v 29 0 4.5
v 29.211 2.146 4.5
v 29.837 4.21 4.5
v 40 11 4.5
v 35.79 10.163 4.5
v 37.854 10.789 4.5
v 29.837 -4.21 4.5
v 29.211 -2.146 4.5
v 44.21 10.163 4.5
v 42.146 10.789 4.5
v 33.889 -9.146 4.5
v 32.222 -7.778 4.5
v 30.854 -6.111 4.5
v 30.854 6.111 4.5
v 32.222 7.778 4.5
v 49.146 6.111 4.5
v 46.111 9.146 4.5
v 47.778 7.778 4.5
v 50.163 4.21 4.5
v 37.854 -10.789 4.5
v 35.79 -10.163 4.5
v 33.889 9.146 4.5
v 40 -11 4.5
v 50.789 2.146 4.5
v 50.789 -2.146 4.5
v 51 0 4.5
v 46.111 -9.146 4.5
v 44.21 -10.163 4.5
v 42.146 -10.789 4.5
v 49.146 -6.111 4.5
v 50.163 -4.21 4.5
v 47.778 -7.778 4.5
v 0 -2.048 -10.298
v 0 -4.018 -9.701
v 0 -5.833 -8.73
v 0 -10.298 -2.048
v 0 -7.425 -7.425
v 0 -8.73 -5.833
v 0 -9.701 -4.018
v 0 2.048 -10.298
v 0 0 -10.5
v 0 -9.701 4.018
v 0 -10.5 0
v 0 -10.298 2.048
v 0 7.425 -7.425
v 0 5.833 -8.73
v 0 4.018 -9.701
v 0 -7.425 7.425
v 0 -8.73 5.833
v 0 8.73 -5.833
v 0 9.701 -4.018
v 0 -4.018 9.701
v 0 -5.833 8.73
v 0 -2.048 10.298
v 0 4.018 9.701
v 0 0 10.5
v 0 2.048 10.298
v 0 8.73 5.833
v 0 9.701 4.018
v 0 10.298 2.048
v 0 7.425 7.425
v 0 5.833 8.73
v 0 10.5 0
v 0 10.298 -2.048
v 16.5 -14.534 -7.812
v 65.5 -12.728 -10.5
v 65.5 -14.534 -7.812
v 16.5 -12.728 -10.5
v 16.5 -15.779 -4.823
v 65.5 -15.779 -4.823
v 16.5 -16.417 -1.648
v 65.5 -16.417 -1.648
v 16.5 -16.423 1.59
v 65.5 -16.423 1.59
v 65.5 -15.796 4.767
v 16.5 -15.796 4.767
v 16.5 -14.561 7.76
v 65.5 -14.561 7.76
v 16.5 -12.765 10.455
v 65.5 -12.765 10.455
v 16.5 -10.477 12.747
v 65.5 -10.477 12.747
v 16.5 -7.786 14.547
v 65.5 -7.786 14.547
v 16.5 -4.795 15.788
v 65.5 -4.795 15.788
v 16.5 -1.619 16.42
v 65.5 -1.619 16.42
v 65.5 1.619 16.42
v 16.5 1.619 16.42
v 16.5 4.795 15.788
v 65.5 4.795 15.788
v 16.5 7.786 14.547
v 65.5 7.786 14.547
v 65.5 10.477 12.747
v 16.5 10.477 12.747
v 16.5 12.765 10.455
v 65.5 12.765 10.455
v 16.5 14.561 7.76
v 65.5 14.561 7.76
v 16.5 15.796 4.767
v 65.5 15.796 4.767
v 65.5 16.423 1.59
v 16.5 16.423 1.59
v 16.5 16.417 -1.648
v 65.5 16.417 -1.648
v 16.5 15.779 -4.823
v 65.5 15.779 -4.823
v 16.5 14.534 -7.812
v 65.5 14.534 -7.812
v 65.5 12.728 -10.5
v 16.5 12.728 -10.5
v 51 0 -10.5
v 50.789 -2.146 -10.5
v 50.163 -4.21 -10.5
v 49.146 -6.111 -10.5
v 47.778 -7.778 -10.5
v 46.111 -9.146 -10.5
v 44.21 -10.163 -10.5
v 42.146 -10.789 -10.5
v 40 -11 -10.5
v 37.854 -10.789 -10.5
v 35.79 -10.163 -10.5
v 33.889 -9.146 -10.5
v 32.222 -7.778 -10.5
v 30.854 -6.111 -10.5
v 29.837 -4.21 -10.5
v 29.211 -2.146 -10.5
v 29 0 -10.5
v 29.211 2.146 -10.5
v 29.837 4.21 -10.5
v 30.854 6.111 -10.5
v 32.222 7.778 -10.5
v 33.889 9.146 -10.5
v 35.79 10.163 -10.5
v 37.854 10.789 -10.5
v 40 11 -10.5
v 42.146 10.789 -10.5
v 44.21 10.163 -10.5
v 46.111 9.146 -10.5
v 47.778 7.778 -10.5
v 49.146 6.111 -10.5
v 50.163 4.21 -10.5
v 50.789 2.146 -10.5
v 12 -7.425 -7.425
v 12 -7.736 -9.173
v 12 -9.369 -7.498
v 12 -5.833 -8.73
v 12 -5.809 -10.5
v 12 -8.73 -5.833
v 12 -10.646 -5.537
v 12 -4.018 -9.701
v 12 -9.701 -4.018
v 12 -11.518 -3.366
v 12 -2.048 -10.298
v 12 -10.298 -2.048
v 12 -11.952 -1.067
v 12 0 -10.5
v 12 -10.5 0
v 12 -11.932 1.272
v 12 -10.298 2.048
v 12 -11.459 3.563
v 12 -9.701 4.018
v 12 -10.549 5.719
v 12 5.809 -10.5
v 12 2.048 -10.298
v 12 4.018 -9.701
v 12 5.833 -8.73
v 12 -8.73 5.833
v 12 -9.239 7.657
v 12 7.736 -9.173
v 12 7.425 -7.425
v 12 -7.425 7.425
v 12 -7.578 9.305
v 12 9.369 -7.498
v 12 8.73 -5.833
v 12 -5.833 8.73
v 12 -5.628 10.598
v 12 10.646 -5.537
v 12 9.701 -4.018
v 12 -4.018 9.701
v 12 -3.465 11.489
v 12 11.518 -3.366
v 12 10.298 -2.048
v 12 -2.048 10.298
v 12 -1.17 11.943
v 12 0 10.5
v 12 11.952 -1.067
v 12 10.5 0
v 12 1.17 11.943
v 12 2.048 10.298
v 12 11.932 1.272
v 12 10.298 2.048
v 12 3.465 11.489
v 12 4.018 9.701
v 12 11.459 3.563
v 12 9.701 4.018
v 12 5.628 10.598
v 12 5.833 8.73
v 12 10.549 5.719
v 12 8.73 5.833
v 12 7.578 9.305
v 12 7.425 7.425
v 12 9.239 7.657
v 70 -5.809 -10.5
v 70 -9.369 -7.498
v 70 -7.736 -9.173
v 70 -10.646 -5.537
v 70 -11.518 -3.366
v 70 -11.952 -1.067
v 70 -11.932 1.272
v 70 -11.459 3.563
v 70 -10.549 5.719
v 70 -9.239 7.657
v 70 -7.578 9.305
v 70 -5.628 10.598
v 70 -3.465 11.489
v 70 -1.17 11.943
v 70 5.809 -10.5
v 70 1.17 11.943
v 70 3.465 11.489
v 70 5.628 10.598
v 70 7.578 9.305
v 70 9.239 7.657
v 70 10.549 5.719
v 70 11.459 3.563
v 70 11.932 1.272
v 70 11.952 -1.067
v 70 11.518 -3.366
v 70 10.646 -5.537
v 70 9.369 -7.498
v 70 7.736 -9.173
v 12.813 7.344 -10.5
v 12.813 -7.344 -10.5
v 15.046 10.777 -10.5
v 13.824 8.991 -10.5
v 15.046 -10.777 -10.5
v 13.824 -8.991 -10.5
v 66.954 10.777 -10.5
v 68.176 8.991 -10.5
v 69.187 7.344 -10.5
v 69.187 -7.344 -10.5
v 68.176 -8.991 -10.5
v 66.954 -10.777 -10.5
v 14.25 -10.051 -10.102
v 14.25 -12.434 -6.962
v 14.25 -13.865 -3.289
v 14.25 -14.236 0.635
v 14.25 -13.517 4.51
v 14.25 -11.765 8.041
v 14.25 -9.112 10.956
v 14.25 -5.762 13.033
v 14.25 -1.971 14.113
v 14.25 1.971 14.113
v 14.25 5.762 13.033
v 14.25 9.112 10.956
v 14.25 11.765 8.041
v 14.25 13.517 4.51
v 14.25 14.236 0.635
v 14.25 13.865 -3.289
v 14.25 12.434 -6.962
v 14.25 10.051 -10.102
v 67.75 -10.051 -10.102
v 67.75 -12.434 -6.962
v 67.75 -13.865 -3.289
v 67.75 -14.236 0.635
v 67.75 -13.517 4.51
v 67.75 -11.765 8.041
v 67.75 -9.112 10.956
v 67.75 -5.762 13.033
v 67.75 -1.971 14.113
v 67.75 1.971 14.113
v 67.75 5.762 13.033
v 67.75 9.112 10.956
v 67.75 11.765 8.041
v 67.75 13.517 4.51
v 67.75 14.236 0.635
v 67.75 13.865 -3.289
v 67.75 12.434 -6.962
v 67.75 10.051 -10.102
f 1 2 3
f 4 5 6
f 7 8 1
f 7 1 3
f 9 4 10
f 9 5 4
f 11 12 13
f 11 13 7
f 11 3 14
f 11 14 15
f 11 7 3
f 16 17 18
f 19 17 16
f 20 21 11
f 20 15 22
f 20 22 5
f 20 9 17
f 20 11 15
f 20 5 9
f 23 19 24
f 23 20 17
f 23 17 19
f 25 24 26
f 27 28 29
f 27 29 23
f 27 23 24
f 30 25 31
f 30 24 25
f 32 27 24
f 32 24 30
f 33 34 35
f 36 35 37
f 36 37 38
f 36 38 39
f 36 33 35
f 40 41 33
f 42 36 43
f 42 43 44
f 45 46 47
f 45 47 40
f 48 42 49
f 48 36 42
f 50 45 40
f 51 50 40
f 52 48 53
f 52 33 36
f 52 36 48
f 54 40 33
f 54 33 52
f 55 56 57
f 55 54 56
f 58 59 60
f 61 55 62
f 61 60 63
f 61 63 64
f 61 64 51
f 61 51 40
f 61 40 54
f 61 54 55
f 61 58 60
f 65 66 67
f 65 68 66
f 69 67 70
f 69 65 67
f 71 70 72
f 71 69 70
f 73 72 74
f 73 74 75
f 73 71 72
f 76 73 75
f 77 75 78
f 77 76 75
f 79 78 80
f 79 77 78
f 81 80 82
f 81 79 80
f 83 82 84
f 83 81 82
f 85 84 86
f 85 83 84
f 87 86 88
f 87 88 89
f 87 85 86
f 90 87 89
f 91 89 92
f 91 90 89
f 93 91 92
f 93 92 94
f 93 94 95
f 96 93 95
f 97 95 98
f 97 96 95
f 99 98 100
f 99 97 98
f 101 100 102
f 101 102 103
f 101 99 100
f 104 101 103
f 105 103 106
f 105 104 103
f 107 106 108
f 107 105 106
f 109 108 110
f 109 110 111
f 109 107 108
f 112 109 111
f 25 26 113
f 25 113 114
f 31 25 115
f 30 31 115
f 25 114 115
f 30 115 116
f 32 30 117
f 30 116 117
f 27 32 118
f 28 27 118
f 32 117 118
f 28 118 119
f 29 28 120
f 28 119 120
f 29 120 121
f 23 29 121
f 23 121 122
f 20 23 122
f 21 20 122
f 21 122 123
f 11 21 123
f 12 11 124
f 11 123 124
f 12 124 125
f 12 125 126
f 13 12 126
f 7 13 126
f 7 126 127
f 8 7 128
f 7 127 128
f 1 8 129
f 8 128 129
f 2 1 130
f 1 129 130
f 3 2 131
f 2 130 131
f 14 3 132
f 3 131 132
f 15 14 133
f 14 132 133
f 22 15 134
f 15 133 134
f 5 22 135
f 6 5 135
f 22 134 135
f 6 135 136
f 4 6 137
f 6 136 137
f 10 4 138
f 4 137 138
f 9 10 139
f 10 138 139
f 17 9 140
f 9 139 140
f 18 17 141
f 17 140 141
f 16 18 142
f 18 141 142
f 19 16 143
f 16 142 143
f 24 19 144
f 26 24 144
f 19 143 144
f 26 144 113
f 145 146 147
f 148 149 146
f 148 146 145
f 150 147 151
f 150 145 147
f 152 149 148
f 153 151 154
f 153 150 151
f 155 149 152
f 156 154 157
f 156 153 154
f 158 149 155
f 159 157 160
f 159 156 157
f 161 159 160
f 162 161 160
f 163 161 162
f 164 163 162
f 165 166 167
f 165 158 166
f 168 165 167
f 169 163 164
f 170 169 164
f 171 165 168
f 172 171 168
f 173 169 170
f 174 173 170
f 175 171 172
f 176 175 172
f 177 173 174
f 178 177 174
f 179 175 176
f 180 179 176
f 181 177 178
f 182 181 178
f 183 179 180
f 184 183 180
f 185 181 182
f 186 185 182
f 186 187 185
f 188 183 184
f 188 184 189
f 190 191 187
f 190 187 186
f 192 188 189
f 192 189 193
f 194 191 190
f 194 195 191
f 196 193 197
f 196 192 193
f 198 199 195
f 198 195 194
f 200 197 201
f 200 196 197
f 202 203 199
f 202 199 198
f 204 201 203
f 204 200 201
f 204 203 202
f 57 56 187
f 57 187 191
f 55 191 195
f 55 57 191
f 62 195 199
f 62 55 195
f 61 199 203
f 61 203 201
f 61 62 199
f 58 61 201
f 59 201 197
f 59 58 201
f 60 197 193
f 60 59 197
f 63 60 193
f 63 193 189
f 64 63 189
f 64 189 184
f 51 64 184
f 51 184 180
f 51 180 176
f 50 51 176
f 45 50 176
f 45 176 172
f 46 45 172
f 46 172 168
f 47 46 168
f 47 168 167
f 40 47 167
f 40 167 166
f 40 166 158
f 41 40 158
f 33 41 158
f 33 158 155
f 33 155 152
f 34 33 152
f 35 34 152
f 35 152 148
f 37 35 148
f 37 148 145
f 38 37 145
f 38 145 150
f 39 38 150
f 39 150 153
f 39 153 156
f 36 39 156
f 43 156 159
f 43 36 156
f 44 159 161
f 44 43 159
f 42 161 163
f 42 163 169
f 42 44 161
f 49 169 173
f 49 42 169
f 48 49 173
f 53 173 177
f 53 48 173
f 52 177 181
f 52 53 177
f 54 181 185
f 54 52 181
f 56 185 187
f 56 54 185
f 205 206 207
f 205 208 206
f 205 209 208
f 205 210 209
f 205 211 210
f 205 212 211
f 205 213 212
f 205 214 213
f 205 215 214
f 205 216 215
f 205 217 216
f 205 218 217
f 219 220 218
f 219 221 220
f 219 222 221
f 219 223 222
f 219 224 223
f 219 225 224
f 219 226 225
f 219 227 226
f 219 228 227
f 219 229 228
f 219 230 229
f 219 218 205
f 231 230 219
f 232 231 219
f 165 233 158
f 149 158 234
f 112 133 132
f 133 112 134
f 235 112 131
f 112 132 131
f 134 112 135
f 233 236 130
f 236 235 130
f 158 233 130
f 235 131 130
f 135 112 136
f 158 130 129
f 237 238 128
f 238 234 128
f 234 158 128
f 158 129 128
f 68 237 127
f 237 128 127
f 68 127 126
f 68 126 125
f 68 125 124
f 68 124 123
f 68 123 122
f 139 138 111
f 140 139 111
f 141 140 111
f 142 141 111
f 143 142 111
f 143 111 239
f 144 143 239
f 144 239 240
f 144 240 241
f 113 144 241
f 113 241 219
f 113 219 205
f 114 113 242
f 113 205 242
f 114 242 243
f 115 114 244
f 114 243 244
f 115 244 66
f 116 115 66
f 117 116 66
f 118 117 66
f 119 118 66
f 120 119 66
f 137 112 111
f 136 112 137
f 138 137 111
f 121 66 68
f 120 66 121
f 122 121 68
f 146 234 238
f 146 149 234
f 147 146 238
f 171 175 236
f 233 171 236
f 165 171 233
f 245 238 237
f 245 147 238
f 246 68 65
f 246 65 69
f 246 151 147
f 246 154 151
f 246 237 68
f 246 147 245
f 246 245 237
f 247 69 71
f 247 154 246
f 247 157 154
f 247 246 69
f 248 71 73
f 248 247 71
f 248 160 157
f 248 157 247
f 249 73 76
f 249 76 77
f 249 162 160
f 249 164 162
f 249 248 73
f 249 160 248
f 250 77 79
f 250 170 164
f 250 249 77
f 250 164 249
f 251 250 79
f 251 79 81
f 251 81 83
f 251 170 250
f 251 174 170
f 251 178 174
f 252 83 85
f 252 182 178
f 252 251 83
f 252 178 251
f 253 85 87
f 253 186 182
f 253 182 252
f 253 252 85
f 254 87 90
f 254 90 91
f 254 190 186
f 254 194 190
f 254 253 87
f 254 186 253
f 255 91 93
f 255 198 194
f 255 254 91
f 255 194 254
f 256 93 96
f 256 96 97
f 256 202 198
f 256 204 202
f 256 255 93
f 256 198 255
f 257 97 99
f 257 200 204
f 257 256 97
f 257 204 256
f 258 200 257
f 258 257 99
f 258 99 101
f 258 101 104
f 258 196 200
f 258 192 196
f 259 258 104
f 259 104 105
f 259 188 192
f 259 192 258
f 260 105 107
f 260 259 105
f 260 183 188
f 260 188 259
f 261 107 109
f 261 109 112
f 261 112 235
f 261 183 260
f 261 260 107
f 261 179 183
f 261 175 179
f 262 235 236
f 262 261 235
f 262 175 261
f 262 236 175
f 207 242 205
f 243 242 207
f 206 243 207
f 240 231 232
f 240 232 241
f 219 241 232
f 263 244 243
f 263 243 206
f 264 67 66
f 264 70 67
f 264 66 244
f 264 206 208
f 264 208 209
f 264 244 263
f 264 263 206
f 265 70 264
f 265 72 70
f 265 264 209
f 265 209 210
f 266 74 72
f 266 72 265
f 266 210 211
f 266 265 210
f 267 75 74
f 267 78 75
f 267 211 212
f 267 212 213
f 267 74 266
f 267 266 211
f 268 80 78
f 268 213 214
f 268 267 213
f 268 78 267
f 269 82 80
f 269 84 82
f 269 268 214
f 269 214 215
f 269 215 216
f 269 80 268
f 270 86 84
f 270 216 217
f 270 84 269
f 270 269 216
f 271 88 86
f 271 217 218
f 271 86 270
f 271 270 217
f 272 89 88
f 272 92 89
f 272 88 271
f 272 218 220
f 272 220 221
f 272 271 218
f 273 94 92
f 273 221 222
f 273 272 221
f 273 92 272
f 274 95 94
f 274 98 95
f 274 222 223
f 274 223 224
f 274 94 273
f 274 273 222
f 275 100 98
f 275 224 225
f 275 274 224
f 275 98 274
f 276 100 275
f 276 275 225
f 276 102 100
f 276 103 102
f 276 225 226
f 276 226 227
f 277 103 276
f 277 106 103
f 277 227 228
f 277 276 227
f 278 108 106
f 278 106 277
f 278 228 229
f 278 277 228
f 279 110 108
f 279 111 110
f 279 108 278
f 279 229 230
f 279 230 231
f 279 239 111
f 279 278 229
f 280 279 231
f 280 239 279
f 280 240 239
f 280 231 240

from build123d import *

# Parameters (mm, degrees)
F3_DEPTH = 73.8
F4_R     = 11
F5_DEPTH = 15


with BuildPart() as f1:
    # F0 (on Front) → F1 (revolve)
    with BuildSketch(Plane.XZ):
        Polygon((0, 10.5), (0, 0), (70, 0), (70, 12), (65.5, 16.5), (16.5, 16.5), (12, 12), (12, 10.5), align=None)
    revolve(axis=Axis((-7.5785342084, 0, 0), (-1, 0, 0)))

    # F2 (on face) → F3 (cut)
    with BuildSketch(Plane.YZ.offset(70)):
        with BuildLine():
            Line((-5.8094750193, -10.5), (-12.7279220614, -10.5))
            ThreePointArc((-12.7279220614, -10.5), (0, -16.5), (12.7279220614, -10.5))
            Line((12.7279220614, -10.5), (5.8094750193, -10.5))
            ThreePointArc((5.8094750193, -10.5), (0, -12), (-5.8094750193, -10.5))
        make_face()
        with BuildLine():
            Line((5.8094750193, -10.5), (-5.8094750193, -10.5))
            ThreePointArc((-5.8094750193, -10.5), (0, -12), (5.8094750193, -10.5))
        make_face()
    extrude(amount=-F3_DEPTH, mode=Mode.SUBTRACT)

    # F4 (on face) → F5 (cut)
    with BuildSketch(Plane(origin=(0, 0, -10.5), x_dir=(1, 0, 0), z_dir=(0, 0, -1))):
        with Locations((40, 0)):
            Circle(F4_R)
    extrude(amount=-F5_DEPTH, mode=Mode.SUBTRACT)


solid = f1.part
